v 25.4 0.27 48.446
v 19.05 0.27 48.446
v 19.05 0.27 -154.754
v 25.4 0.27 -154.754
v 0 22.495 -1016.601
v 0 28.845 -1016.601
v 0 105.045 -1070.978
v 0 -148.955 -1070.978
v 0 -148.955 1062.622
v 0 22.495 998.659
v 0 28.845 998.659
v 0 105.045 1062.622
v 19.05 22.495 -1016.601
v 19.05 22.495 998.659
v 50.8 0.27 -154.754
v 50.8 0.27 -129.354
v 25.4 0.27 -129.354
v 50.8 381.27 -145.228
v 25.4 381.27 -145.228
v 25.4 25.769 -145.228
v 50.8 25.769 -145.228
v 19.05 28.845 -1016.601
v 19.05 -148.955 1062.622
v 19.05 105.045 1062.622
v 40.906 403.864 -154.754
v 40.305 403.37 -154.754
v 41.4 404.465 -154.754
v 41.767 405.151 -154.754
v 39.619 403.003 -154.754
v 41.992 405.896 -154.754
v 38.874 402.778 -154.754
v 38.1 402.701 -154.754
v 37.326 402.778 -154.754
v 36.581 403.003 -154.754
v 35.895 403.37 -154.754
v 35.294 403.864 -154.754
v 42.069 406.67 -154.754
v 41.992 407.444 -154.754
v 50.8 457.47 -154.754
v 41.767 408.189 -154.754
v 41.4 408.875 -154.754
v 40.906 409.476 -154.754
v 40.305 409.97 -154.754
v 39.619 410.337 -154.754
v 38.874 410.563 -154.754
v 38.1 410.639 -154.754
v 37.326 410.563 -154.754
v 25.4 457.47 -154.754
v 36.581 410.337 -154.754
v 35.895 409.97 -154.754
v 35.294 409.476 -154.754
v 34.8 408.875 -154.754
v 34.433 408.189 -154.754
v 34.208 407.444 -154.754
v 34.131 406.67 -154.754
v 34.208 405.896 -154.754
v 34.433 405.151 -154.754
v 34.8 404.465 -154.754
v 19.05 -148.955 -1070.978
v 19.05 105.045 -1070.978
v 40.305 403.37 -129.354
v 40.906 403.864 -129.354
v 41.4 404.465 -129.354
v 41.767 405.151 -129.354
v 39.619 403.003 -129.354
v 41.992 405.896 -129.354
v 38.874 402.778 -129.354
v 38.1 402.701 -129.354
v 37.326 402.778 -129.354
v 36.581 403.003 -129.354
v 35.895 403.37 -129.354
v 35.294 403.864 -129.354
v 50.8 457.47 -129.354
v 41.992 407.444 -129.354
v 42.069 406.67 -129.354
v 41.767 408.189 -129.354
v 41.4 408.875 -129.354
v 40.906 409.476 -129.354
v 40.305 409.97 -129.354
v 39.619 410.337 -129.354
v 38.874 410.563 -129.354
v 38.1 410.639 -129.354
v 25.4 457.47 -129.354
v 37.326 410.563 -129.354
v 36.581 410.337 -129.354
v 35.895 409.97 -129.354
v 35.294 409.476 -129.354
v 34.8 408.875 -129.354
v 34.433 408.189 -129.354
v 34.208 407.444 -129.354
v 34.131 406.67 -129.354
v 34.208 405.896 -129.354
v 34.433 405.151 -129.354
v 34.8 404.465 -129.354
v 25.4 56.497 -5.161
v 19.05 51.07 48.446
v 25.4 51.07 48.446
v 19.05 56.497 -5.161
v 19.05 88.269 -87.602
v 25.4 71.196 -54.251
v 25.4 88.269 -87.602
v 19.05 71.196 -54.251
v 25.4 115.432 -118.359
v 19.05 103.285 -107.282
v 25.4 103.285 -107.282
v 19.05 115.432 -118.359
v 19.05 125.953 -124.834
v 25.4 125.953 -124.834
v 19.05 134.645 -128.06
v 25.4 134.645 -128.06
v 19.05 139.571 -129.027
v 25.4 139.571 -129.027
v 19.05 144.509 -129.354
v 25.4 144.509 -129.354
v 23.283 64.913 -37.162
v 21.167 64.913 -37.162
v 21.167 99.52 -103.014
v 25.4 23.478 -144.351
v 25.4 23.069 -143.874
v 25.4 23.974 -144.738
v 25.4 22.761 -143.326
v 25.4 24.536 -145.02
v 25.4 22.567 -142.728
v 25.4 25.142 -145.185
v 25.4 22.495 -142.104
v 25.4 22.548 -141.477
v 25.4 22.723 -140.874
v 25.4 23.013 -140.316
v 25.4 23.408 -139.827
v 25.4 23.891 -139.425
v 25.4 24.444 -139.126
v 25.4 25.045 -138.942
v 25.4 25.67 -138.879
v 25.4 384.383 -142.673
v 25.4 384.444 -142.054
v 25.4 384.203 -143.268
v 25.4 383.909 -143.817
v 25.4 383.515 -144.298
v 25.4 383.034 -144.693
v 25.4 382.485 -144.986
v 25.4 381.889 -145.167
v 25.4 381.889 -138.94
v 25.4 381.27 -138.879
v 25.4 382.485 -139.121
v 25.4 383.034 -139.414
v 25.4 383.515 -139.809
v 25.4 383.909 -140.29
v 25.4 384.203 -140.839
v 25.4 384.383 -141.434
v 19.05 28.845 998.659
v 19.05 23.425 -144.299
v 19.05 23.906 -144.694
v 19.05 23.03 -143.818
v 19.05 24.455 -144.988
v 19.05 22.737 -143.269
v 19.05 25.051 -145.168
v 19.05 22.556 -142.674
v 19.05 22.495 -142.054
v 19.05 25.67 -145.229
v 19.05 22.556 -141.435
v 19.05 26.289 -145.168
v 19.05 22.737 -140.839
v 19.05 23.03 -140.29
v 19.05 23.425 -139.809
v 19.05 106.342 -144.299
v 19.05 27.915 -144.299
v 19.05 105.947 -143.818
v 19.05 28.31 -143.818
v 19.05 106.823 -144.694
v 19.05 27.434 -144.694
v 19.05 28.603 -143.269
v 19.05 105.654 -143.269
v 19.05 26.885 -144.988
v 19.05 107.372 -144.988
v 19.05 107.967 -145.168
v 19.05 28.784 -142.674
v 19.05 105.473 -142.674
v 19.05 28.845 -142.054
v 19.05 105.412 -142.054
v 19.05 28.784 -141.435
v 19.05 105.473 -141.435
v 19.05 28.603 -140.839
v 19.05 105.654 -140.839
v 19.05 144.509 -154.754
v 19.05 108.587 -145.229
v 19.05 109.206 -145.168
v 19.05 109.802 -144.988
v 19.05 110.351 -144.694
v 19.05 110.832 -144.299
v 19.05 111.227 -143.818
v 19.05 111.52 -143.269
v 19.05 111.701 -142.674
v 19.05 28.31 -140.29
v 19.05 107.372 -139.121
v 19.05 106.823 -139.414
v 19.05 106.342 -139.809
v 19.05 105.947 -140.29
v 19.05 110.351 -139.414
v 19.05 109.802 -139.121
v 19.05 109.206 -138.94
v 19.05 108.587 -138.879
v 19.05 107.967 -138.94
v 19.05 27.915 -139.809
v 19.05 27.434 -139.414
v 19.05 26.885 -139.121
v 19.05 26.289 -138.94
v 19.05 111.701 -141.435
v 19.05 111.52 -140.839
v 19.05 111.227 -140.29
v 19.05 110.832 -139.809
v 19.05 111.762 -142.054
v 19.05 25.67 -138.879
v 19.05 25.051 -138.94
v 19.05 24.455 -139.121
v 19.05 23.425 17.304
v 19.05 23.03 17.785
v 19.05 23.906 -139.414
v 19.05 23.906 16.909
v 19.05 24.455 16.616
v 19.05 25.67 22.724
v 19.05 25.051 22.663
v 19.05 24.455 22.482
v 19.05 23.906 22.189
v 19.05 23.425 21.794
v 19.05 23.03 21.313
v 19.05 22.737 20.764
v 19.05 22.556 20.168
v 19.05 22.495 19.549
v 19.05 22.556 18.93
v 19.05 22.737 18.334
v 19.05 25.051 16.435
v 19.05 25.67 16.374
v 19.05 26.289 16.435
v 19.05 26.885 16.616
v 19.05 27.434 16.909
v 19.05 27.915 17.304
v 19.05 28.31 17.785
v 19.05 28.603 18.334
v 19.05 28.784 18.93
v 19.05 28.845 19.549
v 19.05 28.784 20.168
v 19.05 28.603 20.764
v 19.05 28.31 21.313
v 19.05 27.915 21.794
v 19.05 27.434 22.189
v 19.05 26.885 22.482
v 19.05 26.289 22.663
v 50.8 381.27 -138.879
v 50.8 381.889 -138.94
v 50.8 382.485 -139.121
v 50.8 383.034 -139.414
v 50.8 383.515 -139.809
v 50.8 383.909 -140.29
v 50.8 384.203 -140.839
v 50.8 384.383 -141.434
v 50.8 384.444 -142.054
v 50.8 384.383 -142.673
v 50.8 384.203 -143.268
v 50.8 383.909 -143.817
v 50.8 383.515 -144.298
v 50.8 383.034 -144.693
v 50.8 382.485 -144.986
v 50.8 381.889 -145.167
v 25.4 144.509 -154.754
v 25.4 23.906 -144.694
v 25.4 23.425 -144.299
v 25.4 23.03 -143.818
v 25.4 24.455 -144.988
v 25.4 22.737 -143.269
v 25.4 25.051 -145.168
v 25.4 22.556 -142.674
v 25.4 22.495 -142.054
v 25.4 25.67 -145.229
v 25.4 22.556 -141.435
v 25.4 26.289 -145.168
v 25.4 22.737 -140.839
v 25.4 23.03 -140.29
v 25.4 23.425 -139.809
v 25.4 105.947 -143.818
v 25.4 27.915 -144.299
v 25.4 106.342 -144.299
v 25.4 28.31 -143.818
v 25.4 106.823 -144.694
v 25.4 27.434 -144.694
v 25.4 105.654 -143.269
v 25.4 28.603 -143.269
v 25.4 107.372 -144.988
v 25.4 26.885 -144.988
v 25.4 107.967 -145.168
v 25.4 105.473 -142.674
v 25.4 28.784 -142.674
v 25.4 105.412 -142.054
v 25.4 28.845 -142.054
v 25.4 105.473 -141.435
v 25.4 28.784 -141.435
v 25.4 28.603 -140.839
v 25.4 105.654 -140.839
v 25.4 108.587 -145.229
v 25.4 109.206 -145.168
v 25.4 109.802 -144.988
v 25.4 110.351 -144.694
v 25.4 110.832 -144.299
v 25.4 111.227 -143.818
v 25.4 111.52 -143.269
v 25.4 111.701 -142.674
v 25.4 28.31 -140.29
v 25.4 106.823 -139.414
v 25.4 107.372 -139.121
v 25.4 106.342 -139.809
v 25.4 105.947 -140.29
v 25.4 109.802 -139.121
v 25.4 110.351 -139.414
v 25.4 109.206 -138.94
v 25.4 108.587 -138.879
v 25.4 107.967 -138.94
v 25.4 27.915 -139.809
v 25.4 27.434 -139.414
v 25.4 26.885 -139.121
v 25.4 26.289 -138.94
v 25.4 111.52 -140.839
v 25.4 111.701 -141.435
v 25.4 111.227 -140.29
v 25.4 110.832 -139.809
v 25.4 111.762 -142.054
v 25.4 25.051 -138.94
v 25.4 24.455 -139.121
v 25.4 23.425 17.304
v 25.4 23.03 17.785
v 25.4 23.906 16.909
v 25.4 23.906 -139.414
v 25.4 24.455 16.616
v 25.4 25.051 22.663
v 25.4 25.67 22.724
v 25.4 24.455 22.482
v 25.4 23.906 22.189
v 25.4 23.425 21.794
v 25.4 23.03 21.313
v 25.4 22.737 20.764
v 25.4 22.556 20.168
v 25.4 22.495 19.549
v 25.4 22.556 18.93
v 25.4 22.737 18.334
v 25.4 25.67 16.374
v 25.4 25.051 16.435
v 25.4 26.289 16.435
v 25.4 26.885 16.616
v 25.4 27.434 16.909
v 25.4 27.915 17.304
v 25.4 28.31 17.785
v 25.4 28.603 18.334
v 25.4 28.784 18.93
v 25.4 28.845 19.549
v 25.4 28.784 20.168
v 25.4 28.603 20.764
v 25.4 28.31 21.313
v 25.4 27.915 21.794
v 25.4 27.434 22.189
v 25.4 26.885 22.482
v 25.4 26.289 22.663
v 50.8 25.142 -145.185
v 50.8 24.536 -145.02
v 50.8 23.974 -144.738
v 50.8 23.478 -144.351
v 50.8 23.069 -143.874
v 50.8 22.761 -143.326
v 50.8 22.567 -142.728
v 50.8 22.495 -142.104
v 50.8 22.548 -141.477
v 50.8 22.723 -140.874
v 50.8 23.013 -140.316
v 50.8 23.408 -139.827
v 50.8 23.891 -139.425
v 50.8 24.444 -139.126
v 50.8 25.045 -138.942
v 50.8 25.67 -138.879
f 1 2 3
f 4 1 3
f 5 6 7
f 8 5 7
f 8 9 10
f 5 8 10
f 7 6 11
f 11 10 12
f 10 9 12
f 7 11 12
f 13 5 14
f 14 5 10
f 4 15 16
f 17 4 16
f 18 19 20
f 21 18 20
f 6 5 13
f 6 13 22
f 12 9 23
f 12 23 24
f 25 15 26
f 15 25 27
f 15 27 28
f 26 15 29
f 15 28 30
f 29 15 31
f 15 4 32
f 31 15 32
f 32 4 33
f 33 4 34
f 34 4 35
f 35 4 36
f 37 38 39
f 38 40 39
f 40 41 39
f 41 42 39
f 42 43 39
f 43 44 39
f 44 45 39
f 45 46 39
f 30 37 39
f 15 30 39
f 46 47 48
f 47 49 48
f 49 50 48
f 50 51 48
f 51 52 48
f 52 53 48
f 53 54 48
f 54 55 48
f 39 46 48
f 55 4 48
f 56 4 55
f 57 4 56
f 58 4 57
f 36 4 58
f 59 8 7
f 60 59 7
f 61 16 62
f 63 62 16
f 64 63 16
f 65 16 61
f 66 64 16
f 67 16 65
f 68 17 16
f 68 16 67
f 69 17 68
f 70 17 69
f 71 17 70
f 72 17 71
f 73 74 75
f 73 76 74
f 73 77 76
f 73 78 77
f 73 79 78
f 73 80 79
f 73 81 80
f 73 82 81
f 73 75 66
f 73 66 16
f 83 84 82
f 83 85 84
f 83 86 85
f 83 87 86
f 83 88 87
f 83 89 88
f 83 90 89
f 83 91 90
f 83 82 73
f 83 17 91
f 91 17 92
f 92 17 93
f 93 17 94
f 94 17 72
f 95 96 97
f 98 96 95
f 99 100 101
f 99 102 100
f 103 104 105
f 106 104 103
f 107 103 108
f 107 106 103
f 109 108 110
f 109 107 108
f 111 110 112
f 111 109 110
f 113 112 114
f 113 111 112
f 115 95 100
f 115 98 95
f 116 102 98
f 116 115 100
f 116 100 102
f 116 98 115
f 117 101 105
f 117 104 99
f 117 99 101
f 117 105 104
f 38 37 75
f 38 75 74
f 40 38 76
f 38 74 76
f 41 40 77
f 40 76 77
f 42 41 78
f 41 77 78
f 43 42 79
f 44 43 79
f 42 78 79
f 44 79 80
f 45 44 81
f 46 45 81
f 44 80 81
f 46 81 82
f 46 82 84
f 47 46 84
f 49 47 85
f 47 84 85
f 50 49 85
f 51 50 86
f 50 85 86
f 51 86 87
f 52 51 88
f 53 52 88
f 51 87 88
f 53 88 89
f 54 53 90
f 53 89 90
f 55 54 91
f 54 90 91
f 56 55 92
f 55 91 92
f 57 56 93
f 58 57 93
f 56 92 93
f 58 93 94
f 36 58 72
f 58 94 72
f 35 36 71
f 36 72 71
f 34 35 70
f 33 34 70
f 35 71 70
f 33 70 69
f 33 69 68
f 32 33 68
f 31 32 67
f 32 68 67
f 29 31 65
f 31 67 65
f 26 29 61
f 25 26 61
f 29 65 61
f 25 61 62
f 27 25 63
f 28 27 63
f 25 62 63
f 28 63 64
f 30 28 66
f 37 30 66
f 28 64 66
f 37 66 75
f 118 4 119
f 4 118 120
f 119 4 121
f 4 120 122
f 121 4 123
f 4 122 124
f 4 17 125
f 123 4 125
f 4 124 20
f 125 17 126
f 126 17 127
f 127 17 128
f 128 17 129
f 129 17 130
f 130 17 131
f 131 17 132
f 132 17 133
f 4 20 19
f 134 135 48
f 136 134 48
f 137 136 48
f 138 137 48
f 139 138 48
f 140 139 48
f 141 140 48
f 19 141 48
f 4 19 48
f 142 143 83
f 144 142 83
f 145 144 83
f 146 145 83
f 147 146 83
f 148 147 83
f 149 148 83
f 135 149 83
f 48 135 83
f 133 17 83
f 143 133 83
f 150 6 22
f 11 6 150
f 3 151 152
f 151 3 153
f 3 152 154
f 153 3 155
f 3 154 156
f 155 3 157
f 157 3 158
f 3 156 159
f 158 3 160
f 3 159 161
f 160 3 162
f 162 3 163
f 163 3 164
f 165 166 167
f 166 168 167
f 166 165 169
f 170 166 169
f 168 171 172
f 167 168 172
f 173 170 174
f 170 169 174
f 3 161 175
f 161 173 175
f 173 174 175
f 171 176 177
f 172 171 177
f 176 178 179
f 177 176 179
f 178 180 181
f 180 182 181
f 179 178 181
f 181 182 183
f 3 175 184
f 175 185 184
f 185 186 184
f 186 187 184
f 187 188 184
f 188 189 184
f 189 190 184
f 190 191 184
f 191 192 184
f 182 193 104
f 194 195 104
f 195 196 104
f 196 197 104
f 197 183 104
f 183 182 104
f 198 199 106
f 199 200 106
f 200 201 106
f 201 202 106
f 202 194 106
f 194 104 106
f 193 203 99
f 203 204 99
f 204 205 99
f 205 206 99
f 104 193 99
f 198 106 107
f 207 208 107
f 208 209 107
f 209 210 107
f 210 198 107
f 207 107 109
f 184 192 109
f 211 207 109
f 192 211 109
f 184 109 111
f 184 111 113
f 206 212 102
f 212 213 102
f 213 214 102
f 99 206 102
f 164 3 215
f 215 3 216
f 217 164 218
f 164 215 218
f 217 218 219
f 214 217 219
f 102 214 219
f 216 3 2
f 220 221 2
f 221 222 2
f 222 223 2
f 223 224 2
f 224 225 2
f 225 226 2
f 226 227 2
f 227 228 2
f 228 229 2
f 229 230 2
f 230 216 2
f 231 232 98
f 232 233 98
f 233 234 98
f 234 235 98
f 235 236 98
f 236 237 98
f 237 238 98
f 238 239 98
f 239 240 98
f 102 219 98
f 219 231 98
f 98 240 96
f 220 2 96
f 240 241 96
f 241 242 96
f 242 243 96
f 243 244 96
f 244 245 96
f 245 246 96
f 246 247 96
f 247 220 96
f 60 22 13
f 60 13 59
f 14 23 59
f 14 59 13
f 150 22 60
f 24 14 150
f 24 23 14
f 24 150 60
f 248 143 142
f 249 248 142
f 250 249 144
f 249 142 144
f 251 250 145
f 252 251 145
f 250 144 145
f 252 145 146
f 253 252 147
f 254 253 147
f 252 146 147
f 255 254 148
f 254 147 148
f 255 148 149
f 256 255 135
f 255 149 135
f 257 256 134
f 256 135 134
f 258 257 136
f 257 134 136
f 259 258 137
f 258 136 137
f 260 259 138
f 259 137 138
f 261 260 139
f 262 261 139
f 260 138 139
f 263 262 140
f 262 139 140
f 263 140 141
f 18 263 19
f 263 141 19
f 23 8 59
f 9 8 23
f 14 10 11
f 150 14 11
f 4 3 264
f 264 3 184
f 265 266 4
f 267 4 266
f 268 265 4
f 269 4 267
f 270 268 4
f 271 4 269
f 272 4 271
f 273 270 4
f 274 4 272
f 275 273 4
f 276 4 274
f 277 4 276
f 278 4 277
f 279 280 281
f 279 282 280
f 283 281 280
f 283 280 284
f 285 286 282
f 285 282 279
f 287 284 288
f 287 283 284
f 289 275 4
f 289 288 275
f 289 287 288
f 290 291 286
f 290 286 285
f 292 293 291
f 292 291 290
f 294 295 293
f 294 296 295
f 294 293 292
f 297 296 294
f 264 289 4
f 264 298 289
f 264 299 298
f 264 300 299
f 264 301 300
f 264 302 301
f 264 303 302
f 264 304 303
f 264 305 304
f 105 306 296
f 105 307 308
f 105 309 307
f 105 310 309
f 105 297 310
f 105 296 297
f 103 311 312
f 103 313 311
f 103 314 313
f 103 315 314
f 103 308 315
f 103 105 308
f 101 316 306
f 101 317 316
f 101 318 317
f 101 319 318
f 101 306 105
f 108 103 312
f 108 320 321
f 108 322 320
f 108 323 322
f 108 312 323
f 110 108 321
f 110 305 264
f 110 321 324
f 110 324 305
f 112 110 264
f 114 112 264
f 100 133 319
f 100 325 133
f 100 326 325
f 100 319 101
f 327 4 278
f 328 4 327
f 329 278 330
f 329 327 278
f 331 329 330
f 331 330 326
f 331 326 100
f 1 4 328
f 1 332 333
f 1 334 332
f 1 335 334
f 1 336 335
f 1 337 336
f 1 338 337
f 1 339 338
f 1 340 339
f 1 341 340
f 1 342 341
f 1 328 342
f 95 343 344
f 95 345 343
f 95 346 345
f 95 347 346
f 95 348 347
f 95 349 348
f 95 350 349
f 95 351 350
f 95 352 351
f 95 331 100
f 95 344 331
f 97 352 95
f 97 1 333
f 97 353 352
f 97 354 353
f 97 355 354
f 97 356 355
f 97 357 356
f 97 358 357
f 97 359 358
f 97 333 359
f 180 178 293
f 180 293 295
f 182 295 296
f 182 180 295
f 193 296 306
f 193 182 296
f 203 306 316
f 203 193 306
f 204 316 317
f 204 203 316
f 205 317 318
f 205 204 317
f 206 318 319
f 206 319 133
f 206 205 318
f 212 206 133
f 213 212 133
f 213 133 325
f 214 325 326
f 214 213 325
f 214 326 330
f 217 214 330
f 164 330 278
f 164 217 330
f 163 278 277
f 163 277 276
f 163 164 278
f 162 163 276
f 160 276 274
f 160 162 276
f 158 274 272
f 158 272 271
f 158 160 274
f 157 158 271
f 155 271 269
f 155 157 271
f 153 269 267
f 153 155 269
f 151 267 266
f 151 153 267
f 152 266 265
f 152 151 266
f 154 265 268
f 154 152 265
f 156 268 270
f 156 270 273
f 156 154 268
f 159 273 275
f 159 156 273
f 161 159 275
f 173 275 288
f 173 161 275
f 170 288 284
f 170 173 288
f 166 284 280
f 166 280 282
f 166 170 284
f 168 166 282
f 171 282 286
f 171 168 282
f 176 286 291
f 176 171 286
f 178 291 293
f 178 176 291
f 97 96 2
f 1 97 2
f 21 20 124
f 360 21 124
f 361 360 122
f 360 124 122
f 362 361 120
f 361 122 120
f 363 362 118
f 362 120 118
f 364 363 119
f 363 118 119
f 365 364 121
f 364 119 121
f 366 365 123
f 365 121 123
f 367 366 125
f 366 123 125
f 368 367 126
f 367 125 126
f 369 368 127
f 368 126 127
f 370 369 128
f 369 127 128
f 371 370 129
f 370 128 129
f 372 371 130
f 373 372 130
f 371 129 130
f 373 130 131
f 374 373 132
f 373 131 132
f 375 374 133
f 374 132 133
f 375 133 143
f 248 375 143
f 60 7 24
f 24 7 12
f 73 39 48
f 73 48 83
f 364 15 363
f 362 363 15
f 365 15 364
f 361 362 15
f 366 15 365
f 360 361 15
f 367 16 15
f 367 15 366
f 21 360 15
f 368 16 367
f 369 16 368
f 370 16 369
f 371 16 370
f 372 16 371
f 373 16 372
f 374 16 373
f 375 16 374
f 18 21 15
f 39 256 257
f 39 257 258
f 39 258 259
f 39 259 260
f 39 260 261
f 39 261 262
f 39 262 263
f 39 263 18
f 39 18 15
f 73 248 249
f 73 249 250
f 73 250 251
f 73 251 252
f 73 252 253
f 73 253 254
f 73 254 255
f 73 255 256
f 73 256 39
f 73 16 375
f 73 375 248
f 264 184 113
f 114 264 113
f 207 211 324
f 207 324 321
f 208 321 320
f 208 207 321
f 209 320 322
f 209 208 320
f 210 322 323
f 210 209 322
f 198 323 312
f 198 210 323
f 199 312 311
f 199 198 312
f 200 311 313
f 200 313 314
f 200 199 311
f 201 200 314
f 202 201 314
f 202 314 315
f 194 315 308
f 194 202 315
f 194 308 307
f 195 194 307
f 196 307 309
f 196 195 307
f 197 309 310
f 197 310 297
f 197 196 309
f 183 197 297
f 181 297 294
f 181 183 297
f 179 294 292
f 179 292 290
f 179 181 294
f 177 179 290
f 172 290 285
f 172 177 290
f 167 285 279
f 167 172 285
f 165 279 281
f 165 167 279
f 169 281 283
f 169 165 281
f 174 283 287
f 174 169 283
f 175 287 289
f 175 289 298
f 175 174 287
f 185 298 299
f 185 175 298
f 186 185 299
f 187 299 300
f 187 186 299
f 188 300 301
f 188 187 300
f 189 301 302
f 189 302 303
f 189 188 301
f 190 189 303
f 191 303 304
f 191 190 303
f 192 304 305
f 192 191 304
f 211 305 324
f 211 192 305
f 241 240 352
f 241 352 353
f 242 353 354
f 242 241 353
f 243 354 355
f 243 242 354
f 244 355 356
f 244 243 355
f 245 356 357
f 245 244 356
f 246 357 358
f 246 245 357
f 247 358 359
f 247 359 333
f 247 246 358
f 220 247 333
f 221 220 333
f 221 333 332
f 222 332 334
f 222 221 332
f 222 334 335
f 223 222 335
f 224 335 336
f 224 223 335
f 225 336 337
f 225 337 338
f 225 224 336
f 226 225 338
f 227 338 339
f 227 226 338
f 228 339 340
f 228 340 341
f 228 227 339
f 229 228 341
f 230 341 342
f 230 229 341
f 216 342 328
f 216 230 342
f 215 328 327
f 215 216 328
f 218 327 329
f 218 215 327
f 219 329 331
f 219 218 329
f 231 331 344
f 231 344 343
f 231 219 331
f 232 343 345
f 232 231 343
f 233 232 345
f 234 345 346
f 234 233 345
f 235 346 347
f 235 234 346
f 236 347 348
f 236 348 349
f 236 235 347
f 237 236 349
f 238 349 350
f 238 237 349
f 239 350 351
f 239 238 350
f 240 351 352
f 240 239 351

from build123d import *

# Parameters (mm, degrees)
F0_W     = 254
F0_H     = 2133.6
F0_W_2   = 6.35
F0_H_2   = 2015.2593255043
F1_DEPTH = 19.05
F2_R     = 3.175
F3_DEPTH = 6.35
F4_W     = 457.2
F4_H     = 25.4
F5_DEPTH = 25.4
F6_R     = 3.96875
F7_DEPTH = 25.4


with BuildPart() as f1:
    # F0 (on Right) → F1 (new body)
    with BuildSketch(Plane.YZ):
        with Locations((-21.9549427276, -4.1780695319)):
            Rectangle(F0_W, F0_H)
        with Locations((25.6700572724, -8.9709460735)):
            Rectangle(F0_W_2, F0_H_2, mode=Mode.SUBTRACT)
    extrude(amount=F1_DEPTH)


with BuildPart() as f3:
    # F2 (on face) → F3 (new body)
    with BuildSketch(Plane.YZ.offset(19.05)):
        with BuildLine():
            Line((51.0700572724, 48.4457026833), (0.2700572724, 48.4457026833))
            Line((0.2700572724, 48.4457026833), (0.2700572724, -154.7542973167))
            Line((0.2700572724, -154.7542973167), (51.0700572724, -154.7542973167))
            Line((51.0700572724, -154.7542973167), (144.5092558861, -154.7542973167))
            Line((144.5092558861, -154.7542973167), (144.5092558861, -129.3542973167))
            add(Edge.make_bspline(
                [(51.0700572724, 48.4457026833), (51.0700572724, -40.4542973167), (97.7896565792, -129.3542973167), (144.5092558861, -129.3542973167)],
                knots=[0, 0, 0, 0, 200.8574714507, 200.8574714507, 200.8574714507, 200.8574714507], degree=3))
        make_face()
        with Locations((25.6700572724, -142.0542973167)):
            Circle(F2_R, mode=Mode.SUBTRACT)
        with Locations((108.5868701339, -142.0542973167)):
            Circle(F2_R, mode=Mode.SUBTRACT)
        with Locations((25.6700572724, 19.5489432663)):
            Circle(F2_R, mode=Mode.SUBTRACT)
    extrude(amount=F3_DEPTH)


with BuildPart() as f5:
    # F4 (on face) → F5 (new body)
    with BuildSketch(Plane.YZ.offset(25.4)):
        with Locations((228.8700572724, -142.0542973167)):
            Rectangle(F4_W, F4_H)
        with BuildLine():
            ThreePointArc((25.7690340547, -145.2277542011), (22.4954430748, -142.1037917221), (25.6700572724, -138.8792973167))
            Line((25.6700572724, -138.8792973167), (381.2700572724, -138.8792973167))
            ThreePointArc((381.2700572724, -138.8792973167), (384.4442857146, -142.0535257589), (381.2700572724, -145.2277542011))
            Line((381.2700572724, -145.2277542011), (25.7690340547, -145.2277542011))
        make_face(mode=Mode.SUBTRACT)
    extrude(amount=F5_DEPTH)

    # F6 (on face) → F7 (cut)
    with BuildSketch(Plane.XY.offset(-129.3542973167)):
        with Locations((38.1, 406.6700572724)):
            Circle(F6_R)
    extrude(amount=-F7_DEPTH, mode=Mode.SUBTRACT)


solid = Compound([f1.part, f3.part, f5.part])
